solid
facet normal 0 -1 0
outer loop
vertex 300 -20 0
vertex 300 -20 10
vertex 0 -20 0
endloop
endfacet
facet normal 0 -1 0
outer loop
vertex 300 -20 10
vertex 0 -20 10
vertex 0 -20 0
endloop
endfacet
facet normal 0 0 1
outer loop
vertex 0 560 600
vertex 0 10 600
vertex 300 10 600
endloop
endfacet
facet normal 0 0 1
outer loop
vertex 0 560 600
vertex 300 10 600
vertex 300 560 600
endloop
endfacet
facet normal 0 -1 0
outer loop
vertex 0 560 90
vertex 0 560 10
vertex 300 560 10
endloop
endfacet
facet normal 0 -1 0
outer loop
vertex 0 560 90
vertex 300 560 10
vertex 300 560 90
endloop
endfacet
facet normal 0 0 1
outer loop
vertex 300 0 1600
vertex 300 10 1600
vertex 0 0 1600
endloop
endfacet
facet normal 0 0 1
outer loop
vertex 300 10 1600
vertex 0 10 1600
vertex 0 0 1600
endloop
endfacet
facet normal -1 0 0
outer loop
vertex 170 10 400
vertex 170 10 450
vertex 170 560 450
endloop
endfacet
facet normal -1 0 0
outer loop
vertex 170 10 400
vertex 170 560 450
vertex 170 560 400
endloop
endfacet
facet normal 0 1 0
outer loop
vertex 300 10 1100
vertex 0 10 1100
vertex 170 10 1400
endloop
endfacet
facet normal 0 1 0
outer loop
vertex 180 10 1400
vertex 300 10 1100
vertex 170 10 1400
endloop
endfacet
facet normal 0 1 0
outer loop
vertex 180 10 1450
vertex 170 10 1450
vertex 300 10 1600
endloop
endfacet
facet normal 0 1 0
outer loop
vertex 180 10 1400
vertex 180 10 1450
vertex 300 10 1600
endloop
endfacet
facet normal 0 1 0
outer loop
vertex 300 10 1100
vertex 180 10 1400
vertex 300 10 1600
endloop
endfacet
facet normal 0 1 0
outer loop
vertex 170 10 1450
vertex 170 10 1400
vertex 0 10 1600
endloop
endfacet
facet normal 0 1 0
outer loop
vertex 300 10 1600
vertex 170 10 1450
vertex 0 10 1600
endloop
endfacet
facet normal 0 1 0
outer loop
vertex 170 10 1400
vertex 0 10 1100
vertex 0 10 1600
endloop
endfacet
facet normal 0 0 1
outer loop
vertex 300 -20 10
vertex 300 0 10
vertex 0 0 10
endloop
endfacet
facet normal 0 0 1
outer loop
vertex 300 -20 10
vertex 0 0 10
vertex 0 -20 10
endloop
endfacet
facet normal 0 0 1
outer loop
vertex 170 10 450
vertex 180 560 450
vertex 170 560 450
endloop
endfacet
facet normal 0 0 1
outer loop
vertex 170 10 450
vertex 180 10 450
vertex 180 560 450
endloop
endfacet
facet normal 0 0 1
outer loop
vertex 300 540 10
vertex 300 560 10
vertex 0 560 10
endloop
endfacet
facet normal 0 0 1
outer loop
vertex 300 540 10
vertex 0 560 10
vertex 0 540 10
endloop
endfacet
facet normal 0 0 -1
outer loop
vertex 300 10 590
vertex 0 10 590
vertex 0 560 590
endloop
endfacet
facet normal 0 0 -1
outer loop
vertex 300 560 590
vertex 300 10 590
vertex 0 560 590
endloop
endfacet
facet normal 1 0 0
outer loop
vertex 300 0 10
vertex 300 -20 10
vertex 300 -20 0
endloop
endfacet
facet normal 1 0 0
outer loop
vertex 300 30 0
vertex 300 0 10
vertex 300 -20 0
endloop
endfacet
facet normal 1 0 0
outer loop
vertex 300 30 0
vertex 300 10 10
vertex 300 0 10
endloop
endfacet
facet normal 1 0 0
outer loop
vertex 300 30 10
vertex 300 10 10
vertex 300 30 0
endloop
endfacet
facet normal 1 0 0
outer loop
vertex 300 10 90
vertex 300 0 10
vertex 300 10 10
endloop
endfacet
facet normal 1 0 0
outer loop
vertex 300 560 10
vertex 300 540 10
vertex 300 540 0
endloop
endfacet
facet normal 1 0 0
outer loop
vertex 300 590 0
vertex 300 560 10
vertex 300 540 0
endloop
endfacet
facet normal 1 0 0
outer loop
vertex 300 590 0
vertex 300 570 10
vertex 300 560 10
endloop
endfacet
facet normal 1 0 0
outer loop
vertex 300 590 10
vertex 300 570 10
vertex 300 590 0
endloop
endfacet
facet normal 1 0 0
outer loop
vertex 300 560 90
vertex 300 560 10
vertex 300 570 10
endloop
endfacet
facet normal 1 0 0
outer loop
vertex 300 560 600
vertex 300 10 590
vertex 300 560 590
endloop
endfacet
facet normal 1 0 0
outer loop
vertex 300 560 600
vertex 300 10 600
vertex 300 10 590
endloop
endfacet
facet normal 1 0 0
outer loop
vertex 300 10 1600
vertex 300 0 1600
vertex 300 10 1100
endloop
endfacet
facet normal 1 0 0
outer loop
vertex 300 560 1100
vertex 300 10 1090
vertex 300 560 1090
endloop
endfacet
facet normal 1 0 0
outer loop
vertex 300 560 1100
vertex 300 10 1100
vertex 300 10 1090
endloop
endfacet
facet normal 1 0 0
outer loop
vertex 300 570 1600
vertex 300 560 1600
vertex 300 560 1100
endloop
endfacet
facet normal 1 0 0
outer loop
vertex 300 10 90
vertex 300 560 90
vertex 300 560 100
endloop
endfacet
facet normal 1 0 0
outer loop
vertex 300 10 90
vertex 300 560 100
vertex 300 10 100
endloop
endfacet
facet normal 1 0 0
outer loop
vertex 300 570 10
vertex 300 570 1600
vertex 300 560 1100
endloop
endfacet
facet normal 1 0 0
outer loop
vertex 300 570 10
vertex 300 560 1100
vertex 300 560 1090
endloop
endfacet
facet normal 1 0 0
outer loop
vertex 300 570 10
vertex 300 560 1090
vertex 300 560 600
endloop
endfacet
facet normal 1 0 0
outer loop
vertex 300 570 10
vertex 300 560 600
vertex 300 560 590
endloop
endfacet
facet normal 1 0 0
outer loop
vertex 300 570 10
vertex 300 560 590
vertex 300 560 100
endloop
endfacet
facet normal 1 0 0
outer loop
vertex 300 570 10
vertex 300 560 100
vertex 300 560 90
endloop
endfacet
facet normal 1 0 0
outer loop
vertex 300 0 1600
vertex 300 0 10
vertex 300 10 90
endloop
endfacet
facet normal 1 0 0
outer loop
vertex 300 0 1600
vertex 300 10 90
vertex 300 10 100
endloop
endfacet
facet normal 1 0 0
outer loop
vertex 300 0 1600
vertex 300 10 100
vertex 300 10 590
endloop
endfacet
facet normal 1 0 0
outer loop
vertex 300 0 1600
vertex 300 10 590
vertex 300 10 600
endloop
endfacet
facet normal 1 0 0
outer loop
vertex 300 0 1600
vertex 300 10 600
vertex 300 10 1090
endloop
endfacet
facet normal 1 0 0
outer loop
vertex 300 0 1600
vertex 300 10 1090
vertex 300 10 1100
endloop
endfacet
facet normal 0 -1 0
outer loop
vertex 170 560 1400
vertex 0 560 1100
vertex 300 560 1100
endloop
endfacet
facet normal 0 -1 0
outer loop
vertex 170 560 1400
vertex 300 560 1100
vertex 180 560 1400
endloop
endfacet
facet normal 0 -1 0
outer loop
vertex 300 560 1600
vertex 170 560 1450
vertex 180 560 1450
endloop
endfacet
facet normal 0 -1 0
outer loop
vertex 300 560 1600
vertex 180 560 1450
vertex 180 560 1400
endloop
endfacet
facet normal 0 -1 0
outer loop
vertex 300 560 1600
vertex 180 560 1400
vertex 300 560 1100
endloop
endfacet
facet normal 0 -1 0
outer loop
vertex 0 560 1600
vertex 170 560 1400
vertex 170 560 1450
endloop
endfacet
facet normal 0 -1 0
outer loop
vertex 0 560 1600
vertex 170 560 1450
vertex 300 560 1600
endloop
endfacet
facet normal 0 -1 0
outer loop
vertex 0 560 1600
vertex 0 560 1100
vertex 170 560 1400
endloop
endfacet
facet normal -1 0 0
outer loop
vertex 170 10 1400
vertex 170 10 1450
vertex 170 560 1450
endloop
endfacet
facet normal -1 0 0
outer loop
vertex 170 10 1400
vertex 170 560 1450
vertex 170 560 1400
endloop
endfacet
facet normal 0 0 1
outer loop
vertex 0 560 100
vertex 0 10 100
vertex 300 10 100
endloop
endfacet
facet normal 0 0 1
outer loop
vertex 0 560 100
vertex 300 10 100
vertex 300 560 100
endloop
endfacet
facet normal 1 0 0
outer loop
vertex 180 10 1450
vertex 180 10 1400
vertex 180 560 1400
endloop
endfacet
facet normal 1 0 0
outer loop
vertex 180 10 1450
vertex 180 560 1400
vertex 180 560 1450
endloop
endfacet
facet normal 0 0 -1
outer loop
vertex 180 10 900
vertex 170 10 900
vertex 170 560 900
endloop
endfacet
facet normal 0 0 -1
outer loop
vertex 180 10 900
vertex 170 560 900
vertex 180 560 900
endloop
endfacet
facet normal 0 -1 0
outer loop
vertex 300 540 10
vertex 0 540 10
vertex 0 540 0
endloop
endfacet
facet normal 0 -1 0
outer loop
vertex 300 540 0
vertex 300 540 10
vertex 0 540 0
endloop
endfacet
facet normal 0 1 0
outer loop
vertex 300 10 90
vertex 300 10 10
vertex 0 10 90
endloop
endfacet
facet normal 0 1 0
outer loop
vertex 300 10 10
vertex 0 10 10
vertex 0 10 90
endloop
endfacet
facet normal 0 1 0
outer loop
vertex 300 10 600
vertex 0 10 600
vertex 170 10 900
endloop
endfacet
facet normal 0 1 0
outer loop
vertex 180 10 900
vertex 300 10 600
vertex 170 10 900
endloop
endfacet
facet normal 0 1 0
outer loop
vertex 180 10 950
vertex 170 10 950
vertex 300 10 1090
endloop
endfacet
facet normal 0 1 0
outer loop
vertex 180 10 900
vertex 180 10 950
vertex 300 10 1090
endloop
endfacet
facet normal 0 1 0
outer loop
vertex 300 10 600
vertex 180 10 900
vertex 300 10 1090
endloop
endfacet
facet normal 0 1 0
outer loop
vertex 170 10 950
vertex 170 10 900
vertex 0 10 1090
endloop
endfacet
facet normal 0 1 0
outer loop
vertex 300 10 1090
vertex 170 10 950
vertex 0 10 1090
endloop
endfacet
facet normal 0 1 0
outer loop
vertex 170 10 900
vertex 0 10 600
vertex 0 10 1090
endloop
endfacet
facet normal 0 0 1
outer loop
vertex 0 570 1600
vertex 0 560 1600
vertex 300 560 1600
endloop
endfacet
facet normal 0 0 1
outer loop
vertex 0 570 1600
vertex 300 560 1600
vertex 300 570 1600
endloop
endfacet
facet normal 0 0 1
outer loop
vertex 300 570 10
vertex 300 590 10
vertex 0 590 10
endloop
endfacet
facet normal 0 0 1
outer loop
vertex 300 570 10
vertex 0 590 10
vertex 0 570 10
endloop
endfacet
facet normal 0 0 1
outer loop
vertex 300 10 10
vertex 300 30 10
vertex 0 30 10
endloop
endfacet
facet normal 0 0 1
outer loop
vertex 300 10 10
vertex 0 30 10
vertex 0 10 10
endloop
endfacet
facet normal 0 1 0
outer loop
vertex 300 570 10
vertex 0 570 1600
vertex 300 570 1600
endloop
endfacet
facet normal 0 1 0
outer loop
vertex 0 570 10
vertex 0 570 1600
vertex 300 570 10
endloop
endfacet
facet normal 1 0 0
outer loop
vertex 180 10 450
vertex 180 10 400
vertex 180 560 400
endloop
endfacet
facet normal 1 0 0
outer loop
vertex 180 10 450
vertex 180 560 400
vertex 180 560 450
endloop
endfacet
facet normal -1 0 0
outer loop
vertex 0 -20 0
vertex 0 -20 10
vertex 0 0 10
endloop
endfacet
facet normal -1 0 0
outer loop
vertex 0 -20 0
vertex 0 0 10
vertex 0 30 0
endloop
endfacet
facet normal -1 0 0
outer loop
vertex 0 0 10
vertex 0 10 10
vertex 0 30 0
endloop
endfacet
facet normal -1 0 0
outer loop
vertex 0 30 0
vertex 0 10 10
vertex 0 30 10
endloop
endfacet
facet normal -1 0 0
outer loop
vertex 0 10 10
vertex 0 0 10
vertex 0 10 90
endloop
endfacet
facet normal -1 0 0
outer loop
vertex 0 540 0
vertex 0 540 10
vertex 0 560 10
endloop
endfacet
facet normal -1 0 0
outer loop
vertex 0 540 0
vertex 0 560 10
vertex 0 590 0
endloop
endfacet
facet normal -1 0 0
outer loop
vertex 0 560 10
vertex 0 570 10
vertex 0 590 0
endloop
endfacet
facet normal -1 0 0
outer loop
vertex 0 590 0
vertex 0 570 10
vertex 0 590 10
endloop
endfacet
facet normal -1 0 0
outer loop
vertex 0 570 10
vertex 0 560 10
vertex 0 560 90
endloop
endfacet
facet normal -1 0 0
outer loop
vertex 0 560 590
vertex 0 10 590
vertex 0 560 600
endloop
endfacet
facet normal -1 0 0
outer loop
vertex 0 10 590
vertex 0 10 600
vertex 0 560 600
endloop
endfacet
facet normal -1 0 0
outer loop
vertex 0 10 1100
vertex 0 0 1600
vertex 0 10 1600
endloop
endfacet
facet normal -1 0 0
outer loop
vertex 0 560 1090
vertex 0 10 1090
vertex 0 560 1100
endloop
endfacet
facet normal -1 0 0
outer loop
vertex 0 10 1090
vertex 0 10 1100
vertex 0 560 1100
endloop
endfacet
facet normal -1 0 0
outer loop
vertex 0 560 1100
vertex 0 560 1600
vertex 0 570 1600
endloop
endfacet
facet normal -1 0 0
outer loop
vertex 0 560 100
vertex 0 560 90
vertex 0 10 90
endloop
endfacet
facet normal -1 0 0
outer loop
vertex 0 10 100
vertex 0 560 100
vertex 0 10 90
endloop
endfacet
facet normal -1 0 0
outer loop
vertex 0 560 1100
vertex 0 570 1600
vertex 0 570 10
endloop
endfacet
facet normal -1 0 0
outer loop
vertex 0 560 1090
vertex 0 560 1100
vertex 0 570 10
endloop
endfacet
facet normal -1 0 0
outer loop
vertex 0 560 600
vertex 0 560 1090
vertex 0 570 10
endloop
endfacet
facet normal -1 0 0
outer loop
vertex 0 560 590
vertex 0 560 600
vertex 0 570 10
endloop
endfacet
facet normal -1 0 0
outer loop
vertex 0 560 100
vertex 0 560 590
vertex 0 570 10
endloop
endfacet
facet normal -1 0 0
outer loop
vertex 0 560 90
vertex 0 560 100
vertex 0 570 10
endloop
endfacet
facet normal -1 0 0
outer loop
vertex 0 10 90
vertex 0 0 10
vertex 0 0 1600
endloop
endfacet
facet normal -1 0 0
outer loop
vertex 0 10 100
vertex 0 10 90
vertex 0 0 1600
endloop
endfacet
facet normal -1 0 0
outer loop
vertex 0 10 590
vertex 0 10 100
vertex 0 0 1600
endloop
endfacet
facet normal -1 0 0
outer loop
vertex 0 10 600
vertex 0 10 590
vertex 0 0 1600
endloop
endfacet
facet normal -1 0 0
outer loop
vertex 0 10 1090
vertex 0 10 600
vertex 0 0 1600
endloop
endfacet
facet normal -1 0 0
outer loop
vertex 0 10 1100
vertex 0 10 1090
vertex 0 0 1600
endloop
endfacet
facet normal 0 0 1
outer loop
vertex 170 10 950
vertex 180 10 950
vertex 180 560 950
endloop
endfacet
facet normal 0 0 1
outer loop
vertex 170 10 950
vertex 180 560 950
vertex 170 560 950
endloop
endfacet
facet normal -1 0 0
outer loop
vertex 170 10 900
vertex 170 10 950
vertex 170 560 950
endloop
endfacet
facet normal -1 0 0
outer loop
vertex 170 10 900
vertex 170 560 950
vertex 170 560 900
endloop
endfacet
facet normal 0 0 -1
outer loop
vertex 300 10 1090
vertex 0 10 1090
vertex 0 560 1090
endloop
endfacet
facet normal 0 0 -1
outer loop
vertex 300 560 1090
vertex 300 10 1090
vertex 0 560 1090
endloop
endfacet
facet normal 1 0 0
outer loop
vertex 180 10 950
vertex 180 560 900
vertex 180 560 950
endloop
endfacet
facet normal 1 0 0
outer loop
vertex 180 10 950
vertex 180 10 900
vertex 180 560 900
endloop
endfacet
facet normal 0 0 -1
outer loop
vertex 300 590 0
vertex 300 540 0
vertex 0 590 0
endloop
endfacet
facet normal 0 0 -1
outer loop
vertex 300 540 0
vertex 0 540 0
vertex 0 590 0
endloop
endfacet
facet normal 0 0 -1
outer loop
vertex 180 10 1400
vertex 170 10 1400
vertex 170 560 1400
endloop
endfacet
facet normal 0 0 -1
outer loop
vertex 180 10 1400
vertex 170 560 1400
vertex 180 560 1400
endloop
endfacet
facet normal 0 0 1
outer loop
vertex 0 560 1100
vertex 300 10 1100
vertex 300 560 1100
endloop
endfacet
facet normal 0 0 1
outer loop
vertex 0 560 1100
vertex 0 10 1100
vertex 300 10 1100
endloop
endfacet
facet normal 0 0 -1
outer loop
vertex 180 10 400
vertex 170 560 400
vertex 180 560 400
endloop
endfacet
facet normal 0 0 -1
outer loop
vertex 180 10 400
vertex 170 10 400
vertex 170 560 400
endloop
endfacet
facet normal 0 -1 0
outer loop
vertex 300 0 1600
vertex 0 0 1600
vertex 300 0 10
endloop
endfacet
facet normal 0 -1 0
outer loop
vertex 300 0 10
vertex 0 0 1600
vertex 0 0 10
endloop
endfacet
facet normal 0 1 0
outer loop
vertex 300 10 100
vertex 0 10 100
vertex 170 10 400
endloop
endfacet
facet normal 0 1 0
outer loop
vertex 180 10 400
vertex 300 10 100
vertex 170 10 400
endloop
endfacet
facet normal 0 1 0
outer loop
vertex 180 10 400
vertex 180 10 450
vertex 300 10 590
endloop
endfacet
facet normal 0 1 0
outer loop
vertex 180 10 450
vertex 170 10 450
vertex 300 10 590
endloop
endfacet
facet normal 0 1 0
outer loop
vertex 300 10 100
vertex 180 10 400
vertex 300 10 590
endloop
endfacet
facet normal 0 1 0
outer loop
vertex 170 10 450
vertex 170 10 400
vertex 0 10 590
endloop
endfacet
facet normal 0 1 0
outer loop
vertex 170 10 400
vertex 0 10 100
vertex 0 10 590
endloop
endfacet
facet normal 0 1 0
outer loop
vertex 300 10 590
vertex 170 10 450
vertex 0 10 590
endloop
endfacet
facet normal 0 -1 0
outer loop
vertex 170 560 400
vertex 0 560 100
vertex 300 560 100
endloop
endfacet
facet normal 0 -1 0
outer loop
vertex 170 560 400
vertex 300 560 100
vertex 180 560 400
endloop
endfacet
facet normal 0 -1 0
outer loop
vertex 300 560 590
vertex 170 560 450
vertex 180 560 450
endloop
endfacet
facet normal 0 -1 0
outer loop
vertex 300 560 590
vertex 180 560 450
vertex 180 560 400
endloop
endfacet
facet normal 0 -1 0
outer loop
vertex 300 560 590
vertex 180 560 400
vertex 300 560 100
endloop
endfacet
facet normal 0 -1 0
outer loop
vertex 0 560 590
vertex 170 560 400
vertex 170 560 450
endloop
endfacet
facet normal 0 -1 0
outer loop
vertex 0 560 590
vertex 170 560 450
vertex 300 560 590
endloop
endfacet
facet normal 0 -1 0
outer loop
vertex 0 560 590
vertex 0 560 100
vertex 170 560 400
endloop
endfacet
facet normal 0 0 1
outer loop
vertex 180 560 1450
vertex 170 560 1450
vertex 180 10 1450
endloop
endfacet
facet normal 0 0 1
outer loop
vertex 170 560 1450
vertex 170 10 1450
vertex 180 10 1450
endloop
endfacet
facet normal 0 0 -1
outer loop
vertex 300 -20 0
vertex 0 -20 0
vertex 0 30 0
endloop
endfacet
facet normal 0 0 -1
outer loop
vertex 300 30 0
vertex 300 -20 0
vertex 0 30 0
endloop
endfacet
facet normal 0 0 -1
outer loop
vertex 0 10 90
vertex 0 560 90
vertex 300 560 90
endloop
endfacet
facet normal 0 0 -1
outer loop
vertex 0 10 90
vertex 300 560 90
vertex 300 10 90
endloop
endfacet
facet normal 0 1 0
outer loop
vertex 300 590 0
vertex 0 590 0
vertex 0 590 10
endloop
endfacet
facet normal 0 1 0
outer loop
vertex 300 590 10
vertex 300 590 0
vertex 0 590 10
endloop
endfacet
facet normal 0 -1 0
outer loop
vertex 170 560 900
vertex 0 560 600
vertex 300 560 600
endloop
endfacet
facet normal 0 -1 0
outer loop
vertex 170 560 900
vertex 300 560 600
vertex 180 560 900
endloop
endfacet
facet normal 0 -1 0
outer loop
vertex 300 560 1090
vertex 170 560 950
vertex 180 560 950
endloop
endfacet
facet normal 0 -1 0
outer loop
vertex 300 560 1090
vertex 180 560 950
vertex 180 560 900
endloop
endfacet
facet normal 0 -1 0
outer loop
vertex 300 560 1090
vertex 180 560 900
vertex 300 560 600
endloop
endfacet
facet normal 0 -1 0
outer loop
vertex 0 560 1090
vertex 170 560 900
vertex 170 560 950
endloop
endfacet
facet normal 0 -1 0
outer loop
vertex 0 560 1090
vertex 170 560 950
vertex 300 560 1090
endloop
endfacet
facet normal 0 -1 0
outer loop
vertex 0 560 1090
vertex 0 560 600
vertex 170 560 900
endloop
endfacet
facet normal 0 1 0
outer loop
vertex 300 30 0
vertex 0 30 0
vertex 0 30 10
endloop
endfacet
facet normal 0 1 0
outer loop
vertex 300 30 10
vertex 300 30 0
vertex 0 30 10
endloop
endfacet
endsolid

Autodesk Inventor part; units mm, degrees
ref_plane "YZ Plane" through (0, 0, 0) normal (1, 0, 0) x (0, 1, 0)
ref_plane "XZ Plane" through (0, 0, 0) normal (0, 1, 0) x (-1, 0, 0)
ref_plane "XY Plane" through (0, 0, 0) normal (0, 0, 1) x (1, 0, 0)
sketch "Sketch1" plane through (0, 0, 0) normal (1, 0, 0) x (0, 1, 0)
  line L0 (0, 0) -> (10, 0)
  line L1 (10, 1600) -> (0, 1600)
  line L2 (0, 1600) -> (0, 10)
  line L3 (10, 100) -> (560, 100)
  line L4 (570, 100) -> (570, 90)
  line L5 (560, 90) -> (10, 90)
  line L6 (570, 0) -> (560, 0)
  line L7 (560, 1600) -> (570, 1600)
  line L8 (570, 1600) -> (570, 10)
  line L9 (10, 600) -> (560, 600)
  line L10 (10, 590) -> (560, 590)
  line L11 (10, 1100) -> (560, 1100)
  line L12 (10, 1090) -> (560, 1090)
  line L13 (540, 0) -> (590, 0)
  line L14 (590, 0) -> (590, 10)
  line L15 (540, 10) -> (540, 0)
  line L16 (-20, 0) -> (30, 0)
  line L17 (30, 0) -> (30, 10)
  line L18 (-20, 10) -> (-20, 0)
  line L19 (30, 10) -> (10, 10)
  line L20 (0, 10) -> (-20, 10)
  line L21 (590, 10) -> (570, 10)
  line L22 (560, 10) -> (540, 10)
  line L23 (560, 10) -> (560, 90)
  line L24 (10, 10) -> (10, 90)
  line L25 (10, 100) -> (10, 590)
  line L26 (560, 100) -> (560, 590)
  line L27 (560, 600) -> (560, 1090)
  line L28 (560, 1100) -> (560, 1600)
  line L29 (10, 600) -> (10, 1090)
  line L30 (10, 1100) -> (10, 1600)
  dimension "d0" = 10
  dimension "d1" = 1600
  dimension "d2" = 560
  dimension "d3" = 10
  dimension "d4" = 10
  dimension "d5" = 1600
  dimension "d6" = 50
  dimension "d7" = 10
  dimension "d8" = 50
  dimension "d9" = 10
extrude "Extrusion1" add sketch "Sketch1" along normal blind 300
sketch "Sketch2" plane through (0, 10, 1600) normal (0, 1, 0) x (1, 0, 0)
  line L0 (0, 500) -> (200, 500)
  line L1 (200, 500) -> (200, 100)
  line L2 (200, 100) -> (0, 100)
  line L3 (0, 100) -> (0, 500)
  line L4 (200, 100) -> (180, 100)
  line L5 (180, 100) -> (180, 165)
  line L6 (180, 165) -> (200, 165)
  line L7 (200, 165) -> (200, 100)
  line L8 (180, 100) -> (0, 100)
  line L9 (0, 100) -> (0, 150)
  line L10 (0, 150) -> (180, 150)
  line L11 (180, 150) -> (180, 100)
  line L12 (180, 150) -> (170, 150)
  line L13 (170, 150) -> (170, 200)
  line L14 (170, 200) -> (180, 200)
  line L15 (180, 200) -> (180, 150)
  line L16 (0, 1000) -> (0, 510) projected
  line L17 (0, 1000) -> (180, 1000)
  line L18 (180, 1000) -> (180, 650)
  line L19 (180, 650) -> (0, 650)
  line L20 (0, 650) -> (0, 1000)
  line L21 (0, 1500) -> (180, 1500)
  line L22 (180, 1500) -> (180, 1150)
  line L23 (180, 1150) -> (0, 1150)
  line L24 (0, 1150) -> (0, 1500)
  line L25 (180, 650) -> (170, 650)
  line L26 (170, 650) -> (170, 700)
  line L27 (170, 700) -> (180, 700)
  line L28 (180, 700) -> (180, 650)
  line L29 (180, 1150) -> (170, 1150)
  line L30 (170, 1150) -> (170, 1200)
  line L31 (170, 1200) -> (180, 1200)
  line L32 (180, 1200) -> (180, 1150)
  point P0 (0, 1600)
  dimension "d12" = 200
  dimension "d13" = 400
  dimension "d14" = 20
  dimension "d15" = 65
  dimension "d16" = 180
  dimension "d17" = 50
  dimension "d18" = 10
  dimension "d19" = 50
  dimension "d20" = 180
  dimension "d21" = 350
  dimension "d22" = 180
  dimension "d23" = 350
  dimension "d24" = 10
  dimension "d25" = 50
  dimension "d26" = 10
  dimension "d27" = 50
extrude "Extrusion2" add sketch "Sketch2" along normal blind 550 contours L13 L14 L15 L5 L10 | L26 L27 L18 L19 | L22 L23 L30 L31
properties part number "MoldStore"
